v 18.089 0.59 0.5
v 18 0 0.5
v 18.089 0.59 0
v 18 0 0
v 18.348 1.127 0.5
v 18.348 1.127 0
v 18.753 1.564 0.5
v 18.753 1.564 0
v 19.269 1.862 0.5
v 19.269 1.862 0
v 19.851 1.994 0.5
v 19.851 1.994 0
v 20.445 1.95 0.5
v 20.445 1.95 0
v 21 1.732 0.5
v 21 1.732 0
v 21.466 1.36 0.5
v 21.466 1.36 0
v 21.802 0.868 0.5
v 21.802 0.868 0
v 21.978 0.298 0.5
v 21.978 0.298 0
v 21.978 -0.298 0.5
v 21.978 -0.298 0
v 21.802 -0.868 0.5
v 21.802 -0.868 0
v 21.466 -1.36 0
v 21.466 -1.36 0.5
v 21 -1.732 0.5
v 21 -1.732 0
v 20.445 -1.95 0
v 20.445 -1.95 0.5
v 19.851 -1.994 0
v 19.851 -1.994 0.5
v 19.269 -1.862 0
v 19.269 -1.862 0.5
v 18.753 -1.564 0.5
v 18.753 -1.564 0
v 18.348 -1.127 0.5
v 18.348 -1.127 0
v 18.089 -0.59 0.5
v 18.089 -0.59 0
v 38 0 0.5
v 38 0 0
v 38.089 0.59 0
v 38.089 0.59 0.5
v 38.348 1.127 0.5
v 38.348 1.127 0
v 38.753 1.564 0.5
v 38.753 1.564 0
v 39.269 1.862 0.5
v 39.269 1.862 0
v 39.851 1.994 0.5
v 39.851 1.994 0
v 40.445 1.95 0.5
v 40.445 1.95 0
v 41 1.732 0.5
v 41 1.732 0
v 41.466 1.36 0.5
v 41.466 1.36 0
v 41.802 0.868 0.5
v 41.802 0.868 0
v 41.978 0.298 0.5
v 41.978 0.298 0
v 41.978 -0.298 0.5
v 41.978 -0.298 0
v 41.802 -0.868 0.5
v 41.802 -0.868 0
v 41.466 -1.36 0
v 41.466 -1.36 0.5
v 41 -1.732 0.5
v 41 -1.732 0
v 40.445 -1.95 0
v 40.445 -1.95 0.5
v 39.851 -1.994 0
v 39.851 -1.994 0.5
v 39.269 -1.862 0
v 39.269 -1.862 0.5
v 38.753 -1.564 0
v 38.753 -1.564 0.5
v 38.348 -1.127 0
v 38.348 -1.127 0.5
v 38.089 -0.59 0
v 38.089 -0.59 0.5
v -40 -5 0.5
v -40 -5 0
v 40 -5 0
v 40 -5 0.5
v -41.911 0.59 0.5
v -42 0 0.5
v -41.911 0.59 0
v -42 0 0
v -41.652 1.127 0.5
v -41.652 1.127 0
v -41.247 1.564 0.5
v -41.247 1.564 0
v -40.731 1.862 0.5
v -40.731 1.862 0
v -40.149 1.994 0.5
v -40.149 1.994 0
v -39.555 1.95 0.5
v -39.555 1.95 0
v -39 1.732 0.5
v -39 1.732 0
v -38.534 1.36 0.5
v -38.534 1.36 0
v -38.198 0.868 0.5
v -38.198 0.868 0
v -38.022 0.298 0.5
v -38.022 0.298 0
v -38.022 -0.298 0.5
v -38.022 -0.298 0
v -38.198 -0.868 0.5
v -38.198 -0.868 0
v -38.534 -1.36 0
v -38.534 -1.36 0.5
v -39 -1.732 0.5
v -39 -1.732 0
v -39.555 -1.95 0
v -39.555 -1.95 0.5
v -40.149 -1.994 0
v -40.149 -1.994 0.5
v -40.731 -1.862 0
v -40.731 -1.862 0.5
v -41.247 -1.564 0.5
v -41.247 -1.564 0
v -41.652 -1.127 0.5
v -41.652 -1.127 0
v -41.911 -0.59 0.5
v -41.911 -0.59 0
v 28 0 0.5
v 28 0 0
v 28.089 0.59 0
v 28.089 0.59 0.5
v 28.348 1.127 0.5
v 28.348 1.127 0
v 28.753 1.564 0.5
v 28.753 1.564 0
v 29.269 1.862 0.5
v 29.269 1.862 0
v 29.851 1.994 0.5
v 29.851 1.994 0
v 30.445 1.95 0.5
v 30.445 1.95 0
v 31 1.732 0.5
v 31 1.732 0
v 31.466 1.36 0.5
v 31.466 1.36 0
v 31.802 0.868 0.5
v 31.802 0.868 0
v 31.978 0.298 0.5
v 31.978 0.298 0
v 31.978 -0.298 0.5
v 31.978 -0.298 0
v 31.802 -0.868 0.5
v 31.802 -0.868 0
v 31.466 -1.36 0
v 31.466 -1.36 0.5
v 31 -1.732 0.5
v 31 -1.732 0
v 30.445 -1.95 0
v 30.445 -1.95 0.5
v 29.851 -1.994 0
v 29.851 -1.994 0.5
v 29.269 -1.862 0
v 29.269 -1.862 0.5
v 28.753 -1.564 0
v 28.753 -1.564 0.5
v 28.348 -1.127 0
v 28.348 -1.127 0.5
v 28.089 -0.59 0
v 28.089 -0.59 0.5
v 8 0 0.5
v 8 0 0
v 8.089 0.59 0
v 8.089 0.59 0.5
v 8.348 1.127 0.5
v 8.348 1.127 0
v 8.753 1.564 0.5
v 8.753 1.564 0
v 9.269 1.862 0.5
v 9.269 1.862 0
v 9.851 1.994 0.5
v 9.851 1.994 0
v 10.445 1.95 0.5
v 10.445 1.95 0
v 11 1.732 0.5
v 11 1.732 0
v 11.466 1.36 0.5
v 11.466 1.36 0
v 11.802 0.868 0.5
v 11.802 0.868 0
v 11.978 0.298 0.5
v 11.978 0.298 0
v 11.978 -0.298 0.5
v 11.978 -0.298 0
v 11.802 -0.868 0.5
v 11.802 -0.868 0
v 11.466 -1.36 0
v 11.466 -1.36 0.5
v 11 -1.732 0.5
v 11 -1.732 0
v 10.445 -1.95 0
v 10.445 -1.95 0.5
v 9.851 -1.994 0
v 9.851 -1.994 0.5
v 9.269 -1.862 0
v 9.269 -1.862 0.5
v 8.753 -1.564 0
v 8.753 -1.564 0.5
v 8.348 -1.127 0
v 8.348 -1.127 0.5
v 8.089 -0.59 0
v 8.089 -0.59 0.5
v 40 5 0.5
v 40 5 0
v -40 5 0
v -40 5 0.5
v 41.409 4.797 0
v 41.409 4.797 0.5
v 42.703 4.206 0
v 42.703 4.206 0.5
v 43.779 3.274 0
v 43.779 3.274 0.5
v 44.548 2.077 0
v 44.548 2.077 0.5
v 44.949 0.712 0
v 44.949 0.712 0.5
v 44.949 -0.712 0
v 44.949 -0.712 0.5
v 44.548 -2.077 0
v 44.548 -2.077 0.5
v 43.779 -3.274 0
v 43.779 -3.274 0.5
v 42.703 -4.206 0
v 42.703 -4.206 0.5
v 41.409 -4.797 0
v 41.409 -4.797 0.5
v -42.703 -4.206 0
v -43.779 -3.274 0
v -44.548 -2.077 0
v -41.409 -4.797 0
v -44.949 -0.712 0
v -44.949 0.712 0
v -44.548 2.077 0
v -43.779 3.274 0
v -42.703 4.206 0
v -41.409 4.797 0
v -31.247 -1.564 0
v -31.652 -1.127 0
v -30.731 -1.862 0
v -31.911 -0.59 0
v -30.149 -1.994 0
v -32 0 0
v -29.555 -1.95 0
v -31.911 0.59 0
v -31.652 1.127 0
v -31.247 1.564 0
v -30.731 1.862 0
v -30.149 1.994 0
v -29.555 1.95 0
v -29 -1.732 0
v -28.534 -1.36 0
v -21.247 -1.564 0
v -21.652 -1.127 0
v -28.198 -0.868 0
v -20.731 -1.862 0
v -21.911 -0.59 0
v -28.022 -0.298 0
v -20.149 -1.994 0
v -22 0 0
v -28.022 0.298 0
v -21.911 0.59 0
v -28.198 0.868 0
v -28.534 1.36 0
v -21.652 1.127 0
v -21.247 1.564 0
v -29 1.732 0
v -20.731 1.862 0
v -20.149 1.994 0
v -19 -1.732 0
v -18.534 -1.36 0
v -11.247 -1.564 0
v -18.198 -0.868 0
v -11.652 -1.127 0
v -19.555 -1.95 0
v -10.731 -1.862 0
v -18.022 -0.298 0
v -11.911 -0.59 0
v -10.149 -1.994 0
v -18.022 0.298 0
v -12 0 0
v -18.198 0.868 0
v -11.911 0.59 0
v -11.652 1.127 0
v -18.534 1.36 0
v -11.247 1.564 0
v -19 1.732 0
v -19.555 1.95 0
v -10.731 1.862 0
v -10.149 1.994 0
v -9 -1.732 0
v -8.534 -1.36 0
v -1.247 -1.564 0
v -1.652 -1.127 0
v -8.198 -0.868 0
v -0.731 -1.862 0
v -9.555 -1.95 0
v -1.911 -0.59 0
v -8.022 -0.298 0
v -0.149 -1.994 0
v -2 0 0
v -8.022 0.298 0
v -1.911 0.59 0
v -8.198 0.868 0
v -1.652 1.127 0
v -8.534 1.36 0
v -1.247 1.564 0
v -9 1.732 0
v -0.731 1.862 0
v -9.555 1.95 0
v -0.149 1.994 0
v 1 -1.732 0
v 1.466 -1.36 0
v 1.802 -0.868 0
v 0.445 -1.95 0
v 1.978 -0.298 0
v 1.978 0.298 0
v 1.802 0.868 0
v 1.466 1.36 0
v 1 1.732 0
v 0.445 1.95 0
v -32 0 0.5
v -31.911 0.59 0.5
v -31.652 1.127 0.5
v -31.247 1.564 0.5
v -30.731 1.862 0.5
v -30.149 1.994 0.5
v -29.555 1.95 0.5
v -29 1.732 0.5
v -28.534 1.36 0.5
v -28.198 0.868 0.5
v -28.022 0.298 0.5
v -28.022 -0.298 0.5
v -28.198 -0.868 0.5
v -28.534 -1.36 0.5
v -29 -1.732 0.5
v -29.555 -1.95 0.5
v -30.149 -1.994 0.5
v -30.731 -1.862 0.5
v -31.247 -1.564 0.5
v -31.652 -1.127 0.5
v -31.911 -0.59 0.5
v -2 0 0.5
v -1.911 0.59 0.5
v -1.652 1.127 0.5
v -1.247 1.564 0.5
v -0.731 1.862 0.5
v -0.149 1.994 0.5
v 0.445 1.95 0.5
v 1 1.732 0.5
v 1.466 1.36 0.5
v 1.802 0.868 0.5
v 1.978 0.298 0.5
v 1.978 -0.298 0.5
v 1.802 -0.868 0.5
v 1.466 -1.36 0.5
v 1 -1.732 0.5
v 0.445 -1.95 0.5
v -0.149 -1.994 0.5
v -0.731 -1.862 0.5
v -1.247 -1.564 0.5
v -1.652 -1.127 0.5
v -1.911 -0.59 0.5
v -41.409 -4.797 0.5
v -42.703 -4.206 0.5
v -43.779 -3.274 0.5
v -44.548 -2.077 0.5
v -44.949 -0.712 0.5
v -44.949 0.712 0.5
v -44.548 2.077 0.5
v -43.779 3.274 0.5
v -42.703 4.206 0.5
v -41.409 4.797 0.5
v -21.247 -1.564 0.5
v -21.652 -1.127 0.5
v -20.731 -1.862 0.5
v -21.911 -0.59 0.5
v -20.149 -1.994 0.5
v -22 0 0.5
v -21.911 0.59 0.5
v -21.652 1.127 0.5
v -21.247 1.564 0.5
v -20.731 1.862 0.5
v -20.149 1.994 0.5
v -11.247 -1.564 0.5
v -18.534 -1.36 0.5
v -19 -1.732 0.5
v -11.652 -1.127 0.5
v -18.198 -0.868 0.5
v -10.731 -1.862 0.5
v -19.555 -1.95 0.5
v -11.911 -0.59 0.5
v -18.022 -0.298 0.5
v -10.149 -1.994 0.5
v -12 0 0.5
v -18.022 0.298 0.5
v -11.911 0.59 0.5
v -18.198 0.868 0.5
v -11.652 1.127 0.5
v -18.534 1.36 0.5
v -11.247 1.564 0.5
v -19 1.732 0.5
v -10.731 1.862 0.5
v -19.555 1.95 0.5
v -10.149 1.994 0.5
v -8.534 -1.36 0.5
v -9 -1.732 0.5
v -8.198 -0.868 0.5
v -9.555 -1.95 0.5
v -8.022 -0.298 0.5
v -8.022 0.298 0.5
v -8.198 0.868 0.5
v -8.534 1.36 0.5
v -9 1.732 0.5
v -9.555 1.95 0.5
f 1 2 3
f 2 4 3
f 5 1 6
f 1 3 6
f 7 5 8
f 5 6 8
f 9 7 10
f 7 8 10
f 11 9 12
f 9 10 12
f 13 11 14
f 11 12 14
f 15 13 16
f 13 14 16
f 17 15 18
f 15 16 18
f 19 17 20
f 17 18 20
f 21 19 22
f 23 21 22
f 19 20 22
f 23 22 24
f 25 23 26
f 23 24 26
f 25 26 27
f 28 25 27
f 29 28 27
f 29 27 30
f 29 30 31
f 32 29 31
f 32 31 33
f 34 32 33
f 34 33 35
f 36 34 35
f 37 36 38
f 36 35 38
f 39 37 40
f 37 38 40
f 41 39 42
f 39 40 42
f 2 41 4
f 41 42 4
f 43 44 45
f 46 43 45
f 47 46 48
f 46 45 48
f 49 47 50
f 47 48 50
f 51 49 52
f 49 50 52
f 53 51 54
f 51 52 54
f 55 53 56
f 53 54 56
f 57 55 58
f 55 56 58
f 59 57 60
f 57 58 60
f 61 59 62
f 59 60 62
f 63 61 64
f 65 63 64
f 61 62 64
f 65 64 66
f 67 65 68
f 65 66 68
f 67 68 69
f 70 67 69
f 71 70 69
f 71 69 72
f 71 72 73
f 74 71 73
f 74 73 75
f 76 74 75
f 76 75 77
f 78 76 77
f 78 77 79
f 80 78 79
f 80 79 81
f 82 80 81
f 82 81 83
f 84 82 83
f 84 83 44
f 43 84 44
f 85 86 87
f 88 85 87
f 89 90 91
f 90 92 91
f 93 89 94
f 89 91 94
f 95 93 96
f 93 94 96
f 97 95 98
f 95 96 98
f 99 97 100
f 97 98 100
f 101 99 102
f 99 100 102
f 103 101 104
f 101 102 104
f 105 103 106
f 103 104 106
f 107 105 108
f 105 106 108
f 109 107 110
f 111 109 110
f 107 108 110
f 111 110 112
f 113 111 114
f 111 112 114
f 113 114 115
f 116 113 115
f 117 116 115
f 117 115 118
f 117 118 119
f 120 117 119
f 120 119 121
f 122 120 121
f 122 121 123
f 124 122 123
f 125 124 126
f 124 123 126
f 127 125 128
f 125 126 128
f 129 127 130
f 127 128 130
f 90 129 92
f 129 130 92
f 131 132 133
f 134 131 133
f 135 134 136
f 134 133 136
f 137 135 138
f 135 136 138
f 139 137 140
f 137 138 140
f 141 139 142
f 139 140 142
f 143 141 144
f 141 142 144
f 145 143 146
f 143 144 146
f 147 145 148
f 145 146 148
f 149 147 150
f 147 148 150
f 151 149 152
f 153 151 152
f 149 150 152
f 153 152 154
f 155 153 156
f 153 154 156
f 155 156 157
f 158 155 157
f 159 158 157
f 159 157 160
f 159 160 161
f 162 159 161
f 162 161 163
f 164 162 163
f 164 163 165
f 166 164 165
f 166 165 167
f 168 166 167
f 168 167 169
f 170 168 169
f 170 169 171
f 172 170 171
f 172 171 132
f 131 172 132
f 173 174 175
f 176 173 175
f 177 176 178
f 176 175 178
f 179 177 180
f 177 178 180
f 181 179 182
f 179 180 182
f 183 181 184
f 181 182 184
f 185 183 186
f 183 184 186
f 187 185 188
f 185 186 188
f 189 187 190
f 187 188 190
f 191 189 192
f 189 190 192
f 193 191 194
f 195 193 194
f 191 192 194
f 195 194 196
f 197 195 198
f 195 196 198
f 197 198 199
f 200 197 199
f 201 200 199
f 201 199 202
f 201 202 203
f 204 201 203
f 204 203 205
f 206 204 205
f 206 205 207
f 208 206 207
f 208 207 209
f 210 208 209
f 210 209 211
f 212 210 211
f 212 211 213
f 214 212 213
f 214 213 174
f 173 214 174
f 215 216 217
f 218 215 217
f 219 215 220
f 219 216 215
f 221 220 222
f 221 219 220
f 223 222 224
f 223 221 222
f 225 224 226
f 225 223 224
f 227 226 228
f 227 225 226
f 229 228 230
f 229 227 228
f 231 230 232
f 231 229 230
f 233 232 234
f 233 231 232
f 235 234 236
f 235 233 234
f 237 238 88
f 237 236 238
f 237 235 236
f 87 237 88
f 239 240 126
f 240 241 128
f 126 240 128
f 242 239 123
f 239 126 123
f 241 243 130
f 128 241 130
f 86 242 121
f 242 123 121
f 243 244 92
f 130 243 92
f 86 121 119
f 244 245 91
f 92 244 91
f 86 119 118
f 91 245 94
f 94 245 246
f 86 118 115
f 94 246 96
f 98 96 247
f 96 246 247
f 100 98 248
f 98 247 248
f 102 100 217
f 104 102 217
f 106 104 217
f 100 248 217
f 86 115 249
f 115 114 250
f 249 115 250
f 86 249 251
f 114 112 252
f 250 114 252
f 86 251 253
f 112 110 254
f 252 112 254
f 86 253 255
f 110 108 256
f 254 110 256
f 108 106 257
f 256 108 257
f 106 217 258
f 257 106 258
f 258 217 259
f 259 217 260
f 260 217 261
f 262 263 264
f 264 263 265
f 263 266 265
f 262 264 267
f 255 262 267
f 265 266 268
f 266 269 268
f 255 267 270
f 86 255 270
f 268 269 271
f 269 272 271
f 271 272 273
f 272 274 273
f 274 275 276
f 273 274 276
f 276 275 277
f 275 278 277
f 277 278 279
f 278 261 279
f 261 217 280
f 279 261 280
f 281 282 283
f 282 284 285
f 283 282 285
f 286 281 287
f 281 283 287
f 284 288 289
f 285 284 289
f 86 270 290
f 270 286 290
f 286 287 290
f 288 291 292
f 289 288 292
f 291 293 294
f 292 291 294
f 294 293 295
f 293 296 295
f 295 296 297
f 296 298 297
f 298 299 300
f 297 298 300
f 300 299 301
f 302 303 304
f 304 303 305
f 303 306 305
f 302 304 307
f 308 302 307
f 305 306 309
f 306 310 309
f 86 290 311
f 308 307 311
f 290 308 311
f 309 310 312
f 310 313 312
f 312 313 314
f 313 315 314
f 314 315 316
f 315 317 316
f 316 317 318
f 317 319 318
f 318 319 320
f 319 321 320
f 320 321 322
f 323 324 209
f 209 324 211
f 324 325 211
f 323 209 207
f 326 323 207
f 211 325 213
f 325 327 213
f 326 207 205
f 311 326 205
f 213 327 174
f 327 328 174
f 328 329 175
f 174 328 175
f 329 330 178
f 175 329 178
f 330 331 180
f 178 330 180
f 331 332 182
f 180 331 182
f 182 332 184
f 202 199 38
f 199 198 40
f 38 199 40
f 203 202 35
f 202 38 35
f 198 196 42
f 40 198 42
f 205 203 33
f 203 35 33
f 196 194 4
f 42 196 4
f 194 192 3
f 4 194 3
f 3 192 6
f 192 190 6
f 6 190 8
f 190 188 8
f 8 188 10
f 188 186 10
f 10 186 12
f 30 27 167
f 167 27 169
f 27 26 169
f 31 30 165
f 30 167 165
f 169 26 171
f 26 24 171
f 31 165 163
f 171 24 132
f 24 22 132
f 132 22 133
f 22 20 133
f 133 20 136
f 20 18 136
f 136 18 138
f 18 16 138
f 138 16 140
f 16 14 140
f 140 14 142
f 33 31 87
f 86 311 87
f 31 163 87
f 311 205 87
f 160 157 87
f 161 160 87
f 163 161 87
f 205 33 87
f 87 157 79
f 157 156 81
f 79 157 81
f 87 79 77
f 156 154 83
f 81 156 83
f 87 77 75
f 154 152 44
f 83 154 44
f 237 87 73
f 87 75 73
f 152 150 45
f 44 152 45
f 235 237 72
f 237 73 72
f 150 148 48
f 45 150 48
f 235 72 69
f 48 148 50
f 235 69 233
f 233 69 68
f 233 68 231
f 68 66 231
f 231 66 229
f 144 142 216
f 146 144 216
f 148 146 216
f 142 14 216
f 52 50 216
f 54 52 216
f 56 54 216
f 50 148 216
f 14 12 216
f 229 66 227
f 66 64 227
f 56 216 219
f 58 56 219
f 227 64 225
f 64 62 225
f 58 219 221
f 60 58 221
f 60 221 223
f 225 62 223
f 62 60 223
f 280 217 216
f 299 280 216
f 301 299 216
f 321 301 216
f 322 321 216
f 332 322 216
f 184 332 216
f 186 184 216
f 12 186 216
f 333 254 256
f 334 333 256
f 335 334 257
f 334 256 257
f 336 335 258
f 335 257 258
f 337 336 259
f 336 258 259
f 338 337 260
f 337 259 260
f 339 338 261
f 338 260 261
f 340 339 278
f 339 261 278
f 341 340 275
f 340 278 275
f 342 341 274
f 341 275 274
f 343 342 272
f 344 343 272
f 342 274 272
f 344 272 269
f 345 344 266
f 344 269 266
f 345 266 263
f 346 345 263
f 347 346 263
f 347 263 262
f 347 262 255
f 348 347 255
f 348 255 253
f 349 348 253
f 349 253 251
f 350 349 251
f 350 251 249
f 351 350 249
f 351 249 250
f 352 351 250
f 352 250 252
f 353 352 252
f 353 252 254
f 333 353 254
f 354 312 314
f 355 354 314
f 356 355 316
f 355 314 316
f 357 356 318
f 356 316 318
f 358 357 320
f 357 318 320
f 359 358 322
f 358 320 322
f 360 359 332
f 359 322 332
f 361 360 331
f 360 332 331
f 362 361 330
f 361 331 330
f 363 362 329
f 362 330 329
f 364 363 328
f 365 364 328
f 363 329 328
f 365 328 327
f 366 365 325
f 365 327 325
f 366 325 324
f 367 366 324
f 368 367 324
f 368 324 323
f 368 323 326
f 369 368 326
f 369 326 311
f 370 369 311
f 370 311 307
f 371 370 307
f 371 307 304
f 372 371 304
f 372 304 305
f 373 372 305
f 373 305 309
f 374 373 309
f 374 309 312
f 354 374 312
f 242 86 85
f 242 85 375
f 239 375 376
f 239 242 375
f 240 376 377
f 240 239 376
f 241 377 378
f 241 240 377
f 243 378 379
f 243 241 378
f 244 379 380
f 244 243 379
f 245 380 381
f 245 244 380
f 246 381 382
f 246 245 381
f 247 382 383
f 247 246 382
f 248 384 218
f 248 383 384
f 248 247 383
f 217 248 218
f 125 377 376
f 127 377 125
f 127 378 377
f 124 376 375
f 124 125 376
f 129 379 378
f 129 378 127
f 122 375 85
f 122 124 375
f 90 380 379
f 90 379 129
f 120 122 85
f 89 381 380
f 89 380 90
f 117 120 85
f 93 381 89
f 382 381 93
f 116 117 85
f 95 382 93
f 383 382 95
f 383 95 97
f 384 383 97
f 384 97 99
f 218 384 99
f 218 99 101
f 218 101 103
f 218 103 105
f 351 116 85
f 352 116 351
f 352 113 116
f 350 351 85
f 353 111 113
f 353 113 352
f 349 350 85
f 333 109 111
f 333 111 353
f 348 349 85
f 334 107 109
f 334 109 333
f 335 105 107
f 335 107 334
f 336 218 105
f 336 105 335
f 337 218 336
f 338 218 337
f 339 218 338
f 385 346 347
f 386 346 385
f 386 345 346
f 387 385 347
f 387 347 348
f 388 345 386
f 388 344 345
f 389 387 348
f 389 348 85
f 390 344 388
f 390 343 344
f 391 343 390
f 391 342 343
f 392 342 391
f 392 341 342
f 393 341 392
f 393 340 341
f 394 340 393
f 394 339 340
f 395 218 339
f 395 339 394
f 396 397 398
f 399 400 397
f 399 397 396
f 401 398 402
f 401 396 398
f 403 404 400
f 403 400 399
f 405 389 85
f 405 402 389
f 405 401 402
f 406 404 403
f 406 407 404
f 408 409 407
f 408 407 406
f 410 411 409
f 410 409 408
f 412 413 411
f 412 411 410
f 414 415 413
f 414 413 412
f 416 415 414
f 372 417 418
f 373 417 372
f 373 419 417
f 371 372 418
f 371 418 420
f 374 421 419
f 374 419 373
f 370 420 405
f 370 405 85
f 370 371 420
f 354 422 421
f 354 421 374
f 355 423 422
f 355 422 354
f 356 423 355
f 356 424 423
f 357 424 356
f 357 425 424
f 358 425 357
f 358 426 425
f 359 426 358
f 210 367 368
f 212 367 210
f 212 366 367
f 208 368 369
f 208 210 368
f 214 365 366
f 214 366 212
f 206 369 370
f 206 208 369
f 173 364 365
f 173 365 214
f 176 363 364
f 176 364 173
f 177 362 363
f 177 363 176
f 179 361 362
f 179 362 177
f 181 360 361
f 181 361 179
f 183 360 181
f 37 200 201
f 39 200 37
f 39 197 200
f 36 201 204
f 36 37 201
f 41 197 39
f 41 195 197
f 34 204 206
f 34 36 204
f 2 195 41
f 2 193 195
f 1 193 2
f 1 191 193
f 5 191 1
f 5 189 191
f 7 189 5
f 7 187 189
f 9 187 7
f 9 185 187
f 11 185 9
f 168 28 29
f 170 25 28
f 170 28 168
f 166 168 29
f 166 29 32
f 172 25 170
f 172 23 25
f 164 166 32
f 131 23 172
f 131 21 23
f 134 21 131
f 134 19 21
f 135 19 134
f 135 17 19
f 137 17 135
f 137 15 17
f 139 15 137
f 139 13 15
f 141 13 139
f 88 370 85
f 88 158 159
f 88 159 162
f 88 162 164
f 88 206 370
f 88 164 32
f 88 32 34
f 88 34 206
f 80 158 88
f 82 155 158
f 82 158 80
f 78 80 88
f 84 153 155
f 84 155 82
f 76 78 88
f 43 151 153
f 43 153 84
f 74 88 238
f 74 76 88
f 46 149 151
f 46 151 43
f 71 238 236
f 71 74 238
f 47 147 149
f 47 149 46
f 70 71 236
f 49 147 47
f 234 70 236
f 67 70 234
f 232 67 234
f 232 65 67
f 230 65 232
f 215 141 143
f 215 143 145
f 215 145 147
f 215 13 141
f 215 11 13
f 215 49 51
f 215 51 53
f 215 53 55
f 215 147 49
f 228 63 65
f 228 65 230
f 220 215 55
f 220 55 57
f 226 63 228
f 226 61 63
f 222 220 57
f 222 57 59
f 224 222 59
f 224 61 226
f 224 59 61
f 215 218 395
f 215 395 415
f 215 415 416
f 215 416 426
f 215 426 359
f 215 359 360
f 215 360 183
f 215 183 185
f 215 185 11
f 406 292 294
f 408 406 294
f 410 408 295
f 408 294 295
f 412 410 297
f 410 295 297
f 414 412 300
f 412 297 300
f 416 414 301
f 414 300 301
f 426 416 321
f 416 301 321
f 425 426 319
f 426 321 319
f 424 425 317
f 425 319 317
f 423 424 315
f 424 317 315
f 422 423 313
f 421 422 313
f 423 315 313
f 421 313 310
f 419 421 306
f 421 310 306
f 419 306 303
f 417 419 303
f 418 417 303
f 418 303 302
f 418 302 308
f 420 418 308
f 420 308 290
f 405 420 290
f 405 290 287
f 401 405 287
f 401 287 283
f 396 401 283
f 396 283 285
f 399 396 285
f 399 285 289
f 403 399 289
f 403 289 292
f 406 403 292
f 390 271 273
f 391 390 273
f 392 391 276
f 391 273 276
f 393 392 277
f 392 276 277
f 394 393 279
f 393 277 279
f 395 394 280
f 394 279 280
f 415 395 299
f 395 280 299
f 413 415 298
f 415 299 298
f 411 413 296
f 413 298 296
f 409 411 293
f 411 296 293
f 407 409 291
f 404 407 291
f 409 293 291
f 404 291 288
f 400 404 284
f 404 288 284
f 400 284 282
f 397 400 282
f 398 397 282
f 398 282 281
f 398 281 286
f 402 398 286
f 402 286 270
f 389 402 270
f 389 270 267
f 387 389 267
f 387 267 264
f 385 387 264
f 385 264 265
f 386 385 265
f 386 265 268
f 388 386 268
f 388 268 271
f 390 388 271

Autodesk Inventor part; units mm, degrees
ref_plane "YZ Plane" through (0, 0, 0) normal (1, 0, 0) x (0, 1, 0)
ref_plane "XZ Plane" through (0, 0, 0) normal (0, 1, 0) x (-1, 0, 0)
ref_plane "XY Plane" through (0, 0, 0) normal (0, 0, 1) x (1, 0, 0)
sketch "Náčrt1" plane through (0, 0, 0) normal (0, 0, 1) x (1, 0, 0)
  line L0 (-40, 0) -> (40, 0) construction
  line L1 (-40, -5) -> (40, -5)
  line L2 (40, 5) -> (-40, 5)
  arc A0 (-40, 5) -> (-40, -5) centre (-40, 0) ccw
  arc A1 (40, -5) -> (40, 5) centre (40, 0) ccw
  point P0 (0, 0)
  point P1 (45, 0)
  dimension "d0" = 45
  dimension "d1" = 5
extrude "Vysunutí1" add sketch "Náčrt1" along normal blind 0.5
sketch "Náčrt2" plane through (0, 0, 0) normal (0, 0, -1) x (-1, 0, 0)
  arc A0 (40, -5) -> (40, 5) centre (40, 0) ccw projected
  circle A1 centre (40, 0) radius 2
  point P0 (0, 0)
  dimension "d4" = 4
extrude "Vysunutí2" cut sketch "Náčrt2" against normal through all
pattern_linear "Obdélníkové pole1" count 9 spacing 10 along (1, 0, 0) of "Vysunutí2"
properties part number "1009"
